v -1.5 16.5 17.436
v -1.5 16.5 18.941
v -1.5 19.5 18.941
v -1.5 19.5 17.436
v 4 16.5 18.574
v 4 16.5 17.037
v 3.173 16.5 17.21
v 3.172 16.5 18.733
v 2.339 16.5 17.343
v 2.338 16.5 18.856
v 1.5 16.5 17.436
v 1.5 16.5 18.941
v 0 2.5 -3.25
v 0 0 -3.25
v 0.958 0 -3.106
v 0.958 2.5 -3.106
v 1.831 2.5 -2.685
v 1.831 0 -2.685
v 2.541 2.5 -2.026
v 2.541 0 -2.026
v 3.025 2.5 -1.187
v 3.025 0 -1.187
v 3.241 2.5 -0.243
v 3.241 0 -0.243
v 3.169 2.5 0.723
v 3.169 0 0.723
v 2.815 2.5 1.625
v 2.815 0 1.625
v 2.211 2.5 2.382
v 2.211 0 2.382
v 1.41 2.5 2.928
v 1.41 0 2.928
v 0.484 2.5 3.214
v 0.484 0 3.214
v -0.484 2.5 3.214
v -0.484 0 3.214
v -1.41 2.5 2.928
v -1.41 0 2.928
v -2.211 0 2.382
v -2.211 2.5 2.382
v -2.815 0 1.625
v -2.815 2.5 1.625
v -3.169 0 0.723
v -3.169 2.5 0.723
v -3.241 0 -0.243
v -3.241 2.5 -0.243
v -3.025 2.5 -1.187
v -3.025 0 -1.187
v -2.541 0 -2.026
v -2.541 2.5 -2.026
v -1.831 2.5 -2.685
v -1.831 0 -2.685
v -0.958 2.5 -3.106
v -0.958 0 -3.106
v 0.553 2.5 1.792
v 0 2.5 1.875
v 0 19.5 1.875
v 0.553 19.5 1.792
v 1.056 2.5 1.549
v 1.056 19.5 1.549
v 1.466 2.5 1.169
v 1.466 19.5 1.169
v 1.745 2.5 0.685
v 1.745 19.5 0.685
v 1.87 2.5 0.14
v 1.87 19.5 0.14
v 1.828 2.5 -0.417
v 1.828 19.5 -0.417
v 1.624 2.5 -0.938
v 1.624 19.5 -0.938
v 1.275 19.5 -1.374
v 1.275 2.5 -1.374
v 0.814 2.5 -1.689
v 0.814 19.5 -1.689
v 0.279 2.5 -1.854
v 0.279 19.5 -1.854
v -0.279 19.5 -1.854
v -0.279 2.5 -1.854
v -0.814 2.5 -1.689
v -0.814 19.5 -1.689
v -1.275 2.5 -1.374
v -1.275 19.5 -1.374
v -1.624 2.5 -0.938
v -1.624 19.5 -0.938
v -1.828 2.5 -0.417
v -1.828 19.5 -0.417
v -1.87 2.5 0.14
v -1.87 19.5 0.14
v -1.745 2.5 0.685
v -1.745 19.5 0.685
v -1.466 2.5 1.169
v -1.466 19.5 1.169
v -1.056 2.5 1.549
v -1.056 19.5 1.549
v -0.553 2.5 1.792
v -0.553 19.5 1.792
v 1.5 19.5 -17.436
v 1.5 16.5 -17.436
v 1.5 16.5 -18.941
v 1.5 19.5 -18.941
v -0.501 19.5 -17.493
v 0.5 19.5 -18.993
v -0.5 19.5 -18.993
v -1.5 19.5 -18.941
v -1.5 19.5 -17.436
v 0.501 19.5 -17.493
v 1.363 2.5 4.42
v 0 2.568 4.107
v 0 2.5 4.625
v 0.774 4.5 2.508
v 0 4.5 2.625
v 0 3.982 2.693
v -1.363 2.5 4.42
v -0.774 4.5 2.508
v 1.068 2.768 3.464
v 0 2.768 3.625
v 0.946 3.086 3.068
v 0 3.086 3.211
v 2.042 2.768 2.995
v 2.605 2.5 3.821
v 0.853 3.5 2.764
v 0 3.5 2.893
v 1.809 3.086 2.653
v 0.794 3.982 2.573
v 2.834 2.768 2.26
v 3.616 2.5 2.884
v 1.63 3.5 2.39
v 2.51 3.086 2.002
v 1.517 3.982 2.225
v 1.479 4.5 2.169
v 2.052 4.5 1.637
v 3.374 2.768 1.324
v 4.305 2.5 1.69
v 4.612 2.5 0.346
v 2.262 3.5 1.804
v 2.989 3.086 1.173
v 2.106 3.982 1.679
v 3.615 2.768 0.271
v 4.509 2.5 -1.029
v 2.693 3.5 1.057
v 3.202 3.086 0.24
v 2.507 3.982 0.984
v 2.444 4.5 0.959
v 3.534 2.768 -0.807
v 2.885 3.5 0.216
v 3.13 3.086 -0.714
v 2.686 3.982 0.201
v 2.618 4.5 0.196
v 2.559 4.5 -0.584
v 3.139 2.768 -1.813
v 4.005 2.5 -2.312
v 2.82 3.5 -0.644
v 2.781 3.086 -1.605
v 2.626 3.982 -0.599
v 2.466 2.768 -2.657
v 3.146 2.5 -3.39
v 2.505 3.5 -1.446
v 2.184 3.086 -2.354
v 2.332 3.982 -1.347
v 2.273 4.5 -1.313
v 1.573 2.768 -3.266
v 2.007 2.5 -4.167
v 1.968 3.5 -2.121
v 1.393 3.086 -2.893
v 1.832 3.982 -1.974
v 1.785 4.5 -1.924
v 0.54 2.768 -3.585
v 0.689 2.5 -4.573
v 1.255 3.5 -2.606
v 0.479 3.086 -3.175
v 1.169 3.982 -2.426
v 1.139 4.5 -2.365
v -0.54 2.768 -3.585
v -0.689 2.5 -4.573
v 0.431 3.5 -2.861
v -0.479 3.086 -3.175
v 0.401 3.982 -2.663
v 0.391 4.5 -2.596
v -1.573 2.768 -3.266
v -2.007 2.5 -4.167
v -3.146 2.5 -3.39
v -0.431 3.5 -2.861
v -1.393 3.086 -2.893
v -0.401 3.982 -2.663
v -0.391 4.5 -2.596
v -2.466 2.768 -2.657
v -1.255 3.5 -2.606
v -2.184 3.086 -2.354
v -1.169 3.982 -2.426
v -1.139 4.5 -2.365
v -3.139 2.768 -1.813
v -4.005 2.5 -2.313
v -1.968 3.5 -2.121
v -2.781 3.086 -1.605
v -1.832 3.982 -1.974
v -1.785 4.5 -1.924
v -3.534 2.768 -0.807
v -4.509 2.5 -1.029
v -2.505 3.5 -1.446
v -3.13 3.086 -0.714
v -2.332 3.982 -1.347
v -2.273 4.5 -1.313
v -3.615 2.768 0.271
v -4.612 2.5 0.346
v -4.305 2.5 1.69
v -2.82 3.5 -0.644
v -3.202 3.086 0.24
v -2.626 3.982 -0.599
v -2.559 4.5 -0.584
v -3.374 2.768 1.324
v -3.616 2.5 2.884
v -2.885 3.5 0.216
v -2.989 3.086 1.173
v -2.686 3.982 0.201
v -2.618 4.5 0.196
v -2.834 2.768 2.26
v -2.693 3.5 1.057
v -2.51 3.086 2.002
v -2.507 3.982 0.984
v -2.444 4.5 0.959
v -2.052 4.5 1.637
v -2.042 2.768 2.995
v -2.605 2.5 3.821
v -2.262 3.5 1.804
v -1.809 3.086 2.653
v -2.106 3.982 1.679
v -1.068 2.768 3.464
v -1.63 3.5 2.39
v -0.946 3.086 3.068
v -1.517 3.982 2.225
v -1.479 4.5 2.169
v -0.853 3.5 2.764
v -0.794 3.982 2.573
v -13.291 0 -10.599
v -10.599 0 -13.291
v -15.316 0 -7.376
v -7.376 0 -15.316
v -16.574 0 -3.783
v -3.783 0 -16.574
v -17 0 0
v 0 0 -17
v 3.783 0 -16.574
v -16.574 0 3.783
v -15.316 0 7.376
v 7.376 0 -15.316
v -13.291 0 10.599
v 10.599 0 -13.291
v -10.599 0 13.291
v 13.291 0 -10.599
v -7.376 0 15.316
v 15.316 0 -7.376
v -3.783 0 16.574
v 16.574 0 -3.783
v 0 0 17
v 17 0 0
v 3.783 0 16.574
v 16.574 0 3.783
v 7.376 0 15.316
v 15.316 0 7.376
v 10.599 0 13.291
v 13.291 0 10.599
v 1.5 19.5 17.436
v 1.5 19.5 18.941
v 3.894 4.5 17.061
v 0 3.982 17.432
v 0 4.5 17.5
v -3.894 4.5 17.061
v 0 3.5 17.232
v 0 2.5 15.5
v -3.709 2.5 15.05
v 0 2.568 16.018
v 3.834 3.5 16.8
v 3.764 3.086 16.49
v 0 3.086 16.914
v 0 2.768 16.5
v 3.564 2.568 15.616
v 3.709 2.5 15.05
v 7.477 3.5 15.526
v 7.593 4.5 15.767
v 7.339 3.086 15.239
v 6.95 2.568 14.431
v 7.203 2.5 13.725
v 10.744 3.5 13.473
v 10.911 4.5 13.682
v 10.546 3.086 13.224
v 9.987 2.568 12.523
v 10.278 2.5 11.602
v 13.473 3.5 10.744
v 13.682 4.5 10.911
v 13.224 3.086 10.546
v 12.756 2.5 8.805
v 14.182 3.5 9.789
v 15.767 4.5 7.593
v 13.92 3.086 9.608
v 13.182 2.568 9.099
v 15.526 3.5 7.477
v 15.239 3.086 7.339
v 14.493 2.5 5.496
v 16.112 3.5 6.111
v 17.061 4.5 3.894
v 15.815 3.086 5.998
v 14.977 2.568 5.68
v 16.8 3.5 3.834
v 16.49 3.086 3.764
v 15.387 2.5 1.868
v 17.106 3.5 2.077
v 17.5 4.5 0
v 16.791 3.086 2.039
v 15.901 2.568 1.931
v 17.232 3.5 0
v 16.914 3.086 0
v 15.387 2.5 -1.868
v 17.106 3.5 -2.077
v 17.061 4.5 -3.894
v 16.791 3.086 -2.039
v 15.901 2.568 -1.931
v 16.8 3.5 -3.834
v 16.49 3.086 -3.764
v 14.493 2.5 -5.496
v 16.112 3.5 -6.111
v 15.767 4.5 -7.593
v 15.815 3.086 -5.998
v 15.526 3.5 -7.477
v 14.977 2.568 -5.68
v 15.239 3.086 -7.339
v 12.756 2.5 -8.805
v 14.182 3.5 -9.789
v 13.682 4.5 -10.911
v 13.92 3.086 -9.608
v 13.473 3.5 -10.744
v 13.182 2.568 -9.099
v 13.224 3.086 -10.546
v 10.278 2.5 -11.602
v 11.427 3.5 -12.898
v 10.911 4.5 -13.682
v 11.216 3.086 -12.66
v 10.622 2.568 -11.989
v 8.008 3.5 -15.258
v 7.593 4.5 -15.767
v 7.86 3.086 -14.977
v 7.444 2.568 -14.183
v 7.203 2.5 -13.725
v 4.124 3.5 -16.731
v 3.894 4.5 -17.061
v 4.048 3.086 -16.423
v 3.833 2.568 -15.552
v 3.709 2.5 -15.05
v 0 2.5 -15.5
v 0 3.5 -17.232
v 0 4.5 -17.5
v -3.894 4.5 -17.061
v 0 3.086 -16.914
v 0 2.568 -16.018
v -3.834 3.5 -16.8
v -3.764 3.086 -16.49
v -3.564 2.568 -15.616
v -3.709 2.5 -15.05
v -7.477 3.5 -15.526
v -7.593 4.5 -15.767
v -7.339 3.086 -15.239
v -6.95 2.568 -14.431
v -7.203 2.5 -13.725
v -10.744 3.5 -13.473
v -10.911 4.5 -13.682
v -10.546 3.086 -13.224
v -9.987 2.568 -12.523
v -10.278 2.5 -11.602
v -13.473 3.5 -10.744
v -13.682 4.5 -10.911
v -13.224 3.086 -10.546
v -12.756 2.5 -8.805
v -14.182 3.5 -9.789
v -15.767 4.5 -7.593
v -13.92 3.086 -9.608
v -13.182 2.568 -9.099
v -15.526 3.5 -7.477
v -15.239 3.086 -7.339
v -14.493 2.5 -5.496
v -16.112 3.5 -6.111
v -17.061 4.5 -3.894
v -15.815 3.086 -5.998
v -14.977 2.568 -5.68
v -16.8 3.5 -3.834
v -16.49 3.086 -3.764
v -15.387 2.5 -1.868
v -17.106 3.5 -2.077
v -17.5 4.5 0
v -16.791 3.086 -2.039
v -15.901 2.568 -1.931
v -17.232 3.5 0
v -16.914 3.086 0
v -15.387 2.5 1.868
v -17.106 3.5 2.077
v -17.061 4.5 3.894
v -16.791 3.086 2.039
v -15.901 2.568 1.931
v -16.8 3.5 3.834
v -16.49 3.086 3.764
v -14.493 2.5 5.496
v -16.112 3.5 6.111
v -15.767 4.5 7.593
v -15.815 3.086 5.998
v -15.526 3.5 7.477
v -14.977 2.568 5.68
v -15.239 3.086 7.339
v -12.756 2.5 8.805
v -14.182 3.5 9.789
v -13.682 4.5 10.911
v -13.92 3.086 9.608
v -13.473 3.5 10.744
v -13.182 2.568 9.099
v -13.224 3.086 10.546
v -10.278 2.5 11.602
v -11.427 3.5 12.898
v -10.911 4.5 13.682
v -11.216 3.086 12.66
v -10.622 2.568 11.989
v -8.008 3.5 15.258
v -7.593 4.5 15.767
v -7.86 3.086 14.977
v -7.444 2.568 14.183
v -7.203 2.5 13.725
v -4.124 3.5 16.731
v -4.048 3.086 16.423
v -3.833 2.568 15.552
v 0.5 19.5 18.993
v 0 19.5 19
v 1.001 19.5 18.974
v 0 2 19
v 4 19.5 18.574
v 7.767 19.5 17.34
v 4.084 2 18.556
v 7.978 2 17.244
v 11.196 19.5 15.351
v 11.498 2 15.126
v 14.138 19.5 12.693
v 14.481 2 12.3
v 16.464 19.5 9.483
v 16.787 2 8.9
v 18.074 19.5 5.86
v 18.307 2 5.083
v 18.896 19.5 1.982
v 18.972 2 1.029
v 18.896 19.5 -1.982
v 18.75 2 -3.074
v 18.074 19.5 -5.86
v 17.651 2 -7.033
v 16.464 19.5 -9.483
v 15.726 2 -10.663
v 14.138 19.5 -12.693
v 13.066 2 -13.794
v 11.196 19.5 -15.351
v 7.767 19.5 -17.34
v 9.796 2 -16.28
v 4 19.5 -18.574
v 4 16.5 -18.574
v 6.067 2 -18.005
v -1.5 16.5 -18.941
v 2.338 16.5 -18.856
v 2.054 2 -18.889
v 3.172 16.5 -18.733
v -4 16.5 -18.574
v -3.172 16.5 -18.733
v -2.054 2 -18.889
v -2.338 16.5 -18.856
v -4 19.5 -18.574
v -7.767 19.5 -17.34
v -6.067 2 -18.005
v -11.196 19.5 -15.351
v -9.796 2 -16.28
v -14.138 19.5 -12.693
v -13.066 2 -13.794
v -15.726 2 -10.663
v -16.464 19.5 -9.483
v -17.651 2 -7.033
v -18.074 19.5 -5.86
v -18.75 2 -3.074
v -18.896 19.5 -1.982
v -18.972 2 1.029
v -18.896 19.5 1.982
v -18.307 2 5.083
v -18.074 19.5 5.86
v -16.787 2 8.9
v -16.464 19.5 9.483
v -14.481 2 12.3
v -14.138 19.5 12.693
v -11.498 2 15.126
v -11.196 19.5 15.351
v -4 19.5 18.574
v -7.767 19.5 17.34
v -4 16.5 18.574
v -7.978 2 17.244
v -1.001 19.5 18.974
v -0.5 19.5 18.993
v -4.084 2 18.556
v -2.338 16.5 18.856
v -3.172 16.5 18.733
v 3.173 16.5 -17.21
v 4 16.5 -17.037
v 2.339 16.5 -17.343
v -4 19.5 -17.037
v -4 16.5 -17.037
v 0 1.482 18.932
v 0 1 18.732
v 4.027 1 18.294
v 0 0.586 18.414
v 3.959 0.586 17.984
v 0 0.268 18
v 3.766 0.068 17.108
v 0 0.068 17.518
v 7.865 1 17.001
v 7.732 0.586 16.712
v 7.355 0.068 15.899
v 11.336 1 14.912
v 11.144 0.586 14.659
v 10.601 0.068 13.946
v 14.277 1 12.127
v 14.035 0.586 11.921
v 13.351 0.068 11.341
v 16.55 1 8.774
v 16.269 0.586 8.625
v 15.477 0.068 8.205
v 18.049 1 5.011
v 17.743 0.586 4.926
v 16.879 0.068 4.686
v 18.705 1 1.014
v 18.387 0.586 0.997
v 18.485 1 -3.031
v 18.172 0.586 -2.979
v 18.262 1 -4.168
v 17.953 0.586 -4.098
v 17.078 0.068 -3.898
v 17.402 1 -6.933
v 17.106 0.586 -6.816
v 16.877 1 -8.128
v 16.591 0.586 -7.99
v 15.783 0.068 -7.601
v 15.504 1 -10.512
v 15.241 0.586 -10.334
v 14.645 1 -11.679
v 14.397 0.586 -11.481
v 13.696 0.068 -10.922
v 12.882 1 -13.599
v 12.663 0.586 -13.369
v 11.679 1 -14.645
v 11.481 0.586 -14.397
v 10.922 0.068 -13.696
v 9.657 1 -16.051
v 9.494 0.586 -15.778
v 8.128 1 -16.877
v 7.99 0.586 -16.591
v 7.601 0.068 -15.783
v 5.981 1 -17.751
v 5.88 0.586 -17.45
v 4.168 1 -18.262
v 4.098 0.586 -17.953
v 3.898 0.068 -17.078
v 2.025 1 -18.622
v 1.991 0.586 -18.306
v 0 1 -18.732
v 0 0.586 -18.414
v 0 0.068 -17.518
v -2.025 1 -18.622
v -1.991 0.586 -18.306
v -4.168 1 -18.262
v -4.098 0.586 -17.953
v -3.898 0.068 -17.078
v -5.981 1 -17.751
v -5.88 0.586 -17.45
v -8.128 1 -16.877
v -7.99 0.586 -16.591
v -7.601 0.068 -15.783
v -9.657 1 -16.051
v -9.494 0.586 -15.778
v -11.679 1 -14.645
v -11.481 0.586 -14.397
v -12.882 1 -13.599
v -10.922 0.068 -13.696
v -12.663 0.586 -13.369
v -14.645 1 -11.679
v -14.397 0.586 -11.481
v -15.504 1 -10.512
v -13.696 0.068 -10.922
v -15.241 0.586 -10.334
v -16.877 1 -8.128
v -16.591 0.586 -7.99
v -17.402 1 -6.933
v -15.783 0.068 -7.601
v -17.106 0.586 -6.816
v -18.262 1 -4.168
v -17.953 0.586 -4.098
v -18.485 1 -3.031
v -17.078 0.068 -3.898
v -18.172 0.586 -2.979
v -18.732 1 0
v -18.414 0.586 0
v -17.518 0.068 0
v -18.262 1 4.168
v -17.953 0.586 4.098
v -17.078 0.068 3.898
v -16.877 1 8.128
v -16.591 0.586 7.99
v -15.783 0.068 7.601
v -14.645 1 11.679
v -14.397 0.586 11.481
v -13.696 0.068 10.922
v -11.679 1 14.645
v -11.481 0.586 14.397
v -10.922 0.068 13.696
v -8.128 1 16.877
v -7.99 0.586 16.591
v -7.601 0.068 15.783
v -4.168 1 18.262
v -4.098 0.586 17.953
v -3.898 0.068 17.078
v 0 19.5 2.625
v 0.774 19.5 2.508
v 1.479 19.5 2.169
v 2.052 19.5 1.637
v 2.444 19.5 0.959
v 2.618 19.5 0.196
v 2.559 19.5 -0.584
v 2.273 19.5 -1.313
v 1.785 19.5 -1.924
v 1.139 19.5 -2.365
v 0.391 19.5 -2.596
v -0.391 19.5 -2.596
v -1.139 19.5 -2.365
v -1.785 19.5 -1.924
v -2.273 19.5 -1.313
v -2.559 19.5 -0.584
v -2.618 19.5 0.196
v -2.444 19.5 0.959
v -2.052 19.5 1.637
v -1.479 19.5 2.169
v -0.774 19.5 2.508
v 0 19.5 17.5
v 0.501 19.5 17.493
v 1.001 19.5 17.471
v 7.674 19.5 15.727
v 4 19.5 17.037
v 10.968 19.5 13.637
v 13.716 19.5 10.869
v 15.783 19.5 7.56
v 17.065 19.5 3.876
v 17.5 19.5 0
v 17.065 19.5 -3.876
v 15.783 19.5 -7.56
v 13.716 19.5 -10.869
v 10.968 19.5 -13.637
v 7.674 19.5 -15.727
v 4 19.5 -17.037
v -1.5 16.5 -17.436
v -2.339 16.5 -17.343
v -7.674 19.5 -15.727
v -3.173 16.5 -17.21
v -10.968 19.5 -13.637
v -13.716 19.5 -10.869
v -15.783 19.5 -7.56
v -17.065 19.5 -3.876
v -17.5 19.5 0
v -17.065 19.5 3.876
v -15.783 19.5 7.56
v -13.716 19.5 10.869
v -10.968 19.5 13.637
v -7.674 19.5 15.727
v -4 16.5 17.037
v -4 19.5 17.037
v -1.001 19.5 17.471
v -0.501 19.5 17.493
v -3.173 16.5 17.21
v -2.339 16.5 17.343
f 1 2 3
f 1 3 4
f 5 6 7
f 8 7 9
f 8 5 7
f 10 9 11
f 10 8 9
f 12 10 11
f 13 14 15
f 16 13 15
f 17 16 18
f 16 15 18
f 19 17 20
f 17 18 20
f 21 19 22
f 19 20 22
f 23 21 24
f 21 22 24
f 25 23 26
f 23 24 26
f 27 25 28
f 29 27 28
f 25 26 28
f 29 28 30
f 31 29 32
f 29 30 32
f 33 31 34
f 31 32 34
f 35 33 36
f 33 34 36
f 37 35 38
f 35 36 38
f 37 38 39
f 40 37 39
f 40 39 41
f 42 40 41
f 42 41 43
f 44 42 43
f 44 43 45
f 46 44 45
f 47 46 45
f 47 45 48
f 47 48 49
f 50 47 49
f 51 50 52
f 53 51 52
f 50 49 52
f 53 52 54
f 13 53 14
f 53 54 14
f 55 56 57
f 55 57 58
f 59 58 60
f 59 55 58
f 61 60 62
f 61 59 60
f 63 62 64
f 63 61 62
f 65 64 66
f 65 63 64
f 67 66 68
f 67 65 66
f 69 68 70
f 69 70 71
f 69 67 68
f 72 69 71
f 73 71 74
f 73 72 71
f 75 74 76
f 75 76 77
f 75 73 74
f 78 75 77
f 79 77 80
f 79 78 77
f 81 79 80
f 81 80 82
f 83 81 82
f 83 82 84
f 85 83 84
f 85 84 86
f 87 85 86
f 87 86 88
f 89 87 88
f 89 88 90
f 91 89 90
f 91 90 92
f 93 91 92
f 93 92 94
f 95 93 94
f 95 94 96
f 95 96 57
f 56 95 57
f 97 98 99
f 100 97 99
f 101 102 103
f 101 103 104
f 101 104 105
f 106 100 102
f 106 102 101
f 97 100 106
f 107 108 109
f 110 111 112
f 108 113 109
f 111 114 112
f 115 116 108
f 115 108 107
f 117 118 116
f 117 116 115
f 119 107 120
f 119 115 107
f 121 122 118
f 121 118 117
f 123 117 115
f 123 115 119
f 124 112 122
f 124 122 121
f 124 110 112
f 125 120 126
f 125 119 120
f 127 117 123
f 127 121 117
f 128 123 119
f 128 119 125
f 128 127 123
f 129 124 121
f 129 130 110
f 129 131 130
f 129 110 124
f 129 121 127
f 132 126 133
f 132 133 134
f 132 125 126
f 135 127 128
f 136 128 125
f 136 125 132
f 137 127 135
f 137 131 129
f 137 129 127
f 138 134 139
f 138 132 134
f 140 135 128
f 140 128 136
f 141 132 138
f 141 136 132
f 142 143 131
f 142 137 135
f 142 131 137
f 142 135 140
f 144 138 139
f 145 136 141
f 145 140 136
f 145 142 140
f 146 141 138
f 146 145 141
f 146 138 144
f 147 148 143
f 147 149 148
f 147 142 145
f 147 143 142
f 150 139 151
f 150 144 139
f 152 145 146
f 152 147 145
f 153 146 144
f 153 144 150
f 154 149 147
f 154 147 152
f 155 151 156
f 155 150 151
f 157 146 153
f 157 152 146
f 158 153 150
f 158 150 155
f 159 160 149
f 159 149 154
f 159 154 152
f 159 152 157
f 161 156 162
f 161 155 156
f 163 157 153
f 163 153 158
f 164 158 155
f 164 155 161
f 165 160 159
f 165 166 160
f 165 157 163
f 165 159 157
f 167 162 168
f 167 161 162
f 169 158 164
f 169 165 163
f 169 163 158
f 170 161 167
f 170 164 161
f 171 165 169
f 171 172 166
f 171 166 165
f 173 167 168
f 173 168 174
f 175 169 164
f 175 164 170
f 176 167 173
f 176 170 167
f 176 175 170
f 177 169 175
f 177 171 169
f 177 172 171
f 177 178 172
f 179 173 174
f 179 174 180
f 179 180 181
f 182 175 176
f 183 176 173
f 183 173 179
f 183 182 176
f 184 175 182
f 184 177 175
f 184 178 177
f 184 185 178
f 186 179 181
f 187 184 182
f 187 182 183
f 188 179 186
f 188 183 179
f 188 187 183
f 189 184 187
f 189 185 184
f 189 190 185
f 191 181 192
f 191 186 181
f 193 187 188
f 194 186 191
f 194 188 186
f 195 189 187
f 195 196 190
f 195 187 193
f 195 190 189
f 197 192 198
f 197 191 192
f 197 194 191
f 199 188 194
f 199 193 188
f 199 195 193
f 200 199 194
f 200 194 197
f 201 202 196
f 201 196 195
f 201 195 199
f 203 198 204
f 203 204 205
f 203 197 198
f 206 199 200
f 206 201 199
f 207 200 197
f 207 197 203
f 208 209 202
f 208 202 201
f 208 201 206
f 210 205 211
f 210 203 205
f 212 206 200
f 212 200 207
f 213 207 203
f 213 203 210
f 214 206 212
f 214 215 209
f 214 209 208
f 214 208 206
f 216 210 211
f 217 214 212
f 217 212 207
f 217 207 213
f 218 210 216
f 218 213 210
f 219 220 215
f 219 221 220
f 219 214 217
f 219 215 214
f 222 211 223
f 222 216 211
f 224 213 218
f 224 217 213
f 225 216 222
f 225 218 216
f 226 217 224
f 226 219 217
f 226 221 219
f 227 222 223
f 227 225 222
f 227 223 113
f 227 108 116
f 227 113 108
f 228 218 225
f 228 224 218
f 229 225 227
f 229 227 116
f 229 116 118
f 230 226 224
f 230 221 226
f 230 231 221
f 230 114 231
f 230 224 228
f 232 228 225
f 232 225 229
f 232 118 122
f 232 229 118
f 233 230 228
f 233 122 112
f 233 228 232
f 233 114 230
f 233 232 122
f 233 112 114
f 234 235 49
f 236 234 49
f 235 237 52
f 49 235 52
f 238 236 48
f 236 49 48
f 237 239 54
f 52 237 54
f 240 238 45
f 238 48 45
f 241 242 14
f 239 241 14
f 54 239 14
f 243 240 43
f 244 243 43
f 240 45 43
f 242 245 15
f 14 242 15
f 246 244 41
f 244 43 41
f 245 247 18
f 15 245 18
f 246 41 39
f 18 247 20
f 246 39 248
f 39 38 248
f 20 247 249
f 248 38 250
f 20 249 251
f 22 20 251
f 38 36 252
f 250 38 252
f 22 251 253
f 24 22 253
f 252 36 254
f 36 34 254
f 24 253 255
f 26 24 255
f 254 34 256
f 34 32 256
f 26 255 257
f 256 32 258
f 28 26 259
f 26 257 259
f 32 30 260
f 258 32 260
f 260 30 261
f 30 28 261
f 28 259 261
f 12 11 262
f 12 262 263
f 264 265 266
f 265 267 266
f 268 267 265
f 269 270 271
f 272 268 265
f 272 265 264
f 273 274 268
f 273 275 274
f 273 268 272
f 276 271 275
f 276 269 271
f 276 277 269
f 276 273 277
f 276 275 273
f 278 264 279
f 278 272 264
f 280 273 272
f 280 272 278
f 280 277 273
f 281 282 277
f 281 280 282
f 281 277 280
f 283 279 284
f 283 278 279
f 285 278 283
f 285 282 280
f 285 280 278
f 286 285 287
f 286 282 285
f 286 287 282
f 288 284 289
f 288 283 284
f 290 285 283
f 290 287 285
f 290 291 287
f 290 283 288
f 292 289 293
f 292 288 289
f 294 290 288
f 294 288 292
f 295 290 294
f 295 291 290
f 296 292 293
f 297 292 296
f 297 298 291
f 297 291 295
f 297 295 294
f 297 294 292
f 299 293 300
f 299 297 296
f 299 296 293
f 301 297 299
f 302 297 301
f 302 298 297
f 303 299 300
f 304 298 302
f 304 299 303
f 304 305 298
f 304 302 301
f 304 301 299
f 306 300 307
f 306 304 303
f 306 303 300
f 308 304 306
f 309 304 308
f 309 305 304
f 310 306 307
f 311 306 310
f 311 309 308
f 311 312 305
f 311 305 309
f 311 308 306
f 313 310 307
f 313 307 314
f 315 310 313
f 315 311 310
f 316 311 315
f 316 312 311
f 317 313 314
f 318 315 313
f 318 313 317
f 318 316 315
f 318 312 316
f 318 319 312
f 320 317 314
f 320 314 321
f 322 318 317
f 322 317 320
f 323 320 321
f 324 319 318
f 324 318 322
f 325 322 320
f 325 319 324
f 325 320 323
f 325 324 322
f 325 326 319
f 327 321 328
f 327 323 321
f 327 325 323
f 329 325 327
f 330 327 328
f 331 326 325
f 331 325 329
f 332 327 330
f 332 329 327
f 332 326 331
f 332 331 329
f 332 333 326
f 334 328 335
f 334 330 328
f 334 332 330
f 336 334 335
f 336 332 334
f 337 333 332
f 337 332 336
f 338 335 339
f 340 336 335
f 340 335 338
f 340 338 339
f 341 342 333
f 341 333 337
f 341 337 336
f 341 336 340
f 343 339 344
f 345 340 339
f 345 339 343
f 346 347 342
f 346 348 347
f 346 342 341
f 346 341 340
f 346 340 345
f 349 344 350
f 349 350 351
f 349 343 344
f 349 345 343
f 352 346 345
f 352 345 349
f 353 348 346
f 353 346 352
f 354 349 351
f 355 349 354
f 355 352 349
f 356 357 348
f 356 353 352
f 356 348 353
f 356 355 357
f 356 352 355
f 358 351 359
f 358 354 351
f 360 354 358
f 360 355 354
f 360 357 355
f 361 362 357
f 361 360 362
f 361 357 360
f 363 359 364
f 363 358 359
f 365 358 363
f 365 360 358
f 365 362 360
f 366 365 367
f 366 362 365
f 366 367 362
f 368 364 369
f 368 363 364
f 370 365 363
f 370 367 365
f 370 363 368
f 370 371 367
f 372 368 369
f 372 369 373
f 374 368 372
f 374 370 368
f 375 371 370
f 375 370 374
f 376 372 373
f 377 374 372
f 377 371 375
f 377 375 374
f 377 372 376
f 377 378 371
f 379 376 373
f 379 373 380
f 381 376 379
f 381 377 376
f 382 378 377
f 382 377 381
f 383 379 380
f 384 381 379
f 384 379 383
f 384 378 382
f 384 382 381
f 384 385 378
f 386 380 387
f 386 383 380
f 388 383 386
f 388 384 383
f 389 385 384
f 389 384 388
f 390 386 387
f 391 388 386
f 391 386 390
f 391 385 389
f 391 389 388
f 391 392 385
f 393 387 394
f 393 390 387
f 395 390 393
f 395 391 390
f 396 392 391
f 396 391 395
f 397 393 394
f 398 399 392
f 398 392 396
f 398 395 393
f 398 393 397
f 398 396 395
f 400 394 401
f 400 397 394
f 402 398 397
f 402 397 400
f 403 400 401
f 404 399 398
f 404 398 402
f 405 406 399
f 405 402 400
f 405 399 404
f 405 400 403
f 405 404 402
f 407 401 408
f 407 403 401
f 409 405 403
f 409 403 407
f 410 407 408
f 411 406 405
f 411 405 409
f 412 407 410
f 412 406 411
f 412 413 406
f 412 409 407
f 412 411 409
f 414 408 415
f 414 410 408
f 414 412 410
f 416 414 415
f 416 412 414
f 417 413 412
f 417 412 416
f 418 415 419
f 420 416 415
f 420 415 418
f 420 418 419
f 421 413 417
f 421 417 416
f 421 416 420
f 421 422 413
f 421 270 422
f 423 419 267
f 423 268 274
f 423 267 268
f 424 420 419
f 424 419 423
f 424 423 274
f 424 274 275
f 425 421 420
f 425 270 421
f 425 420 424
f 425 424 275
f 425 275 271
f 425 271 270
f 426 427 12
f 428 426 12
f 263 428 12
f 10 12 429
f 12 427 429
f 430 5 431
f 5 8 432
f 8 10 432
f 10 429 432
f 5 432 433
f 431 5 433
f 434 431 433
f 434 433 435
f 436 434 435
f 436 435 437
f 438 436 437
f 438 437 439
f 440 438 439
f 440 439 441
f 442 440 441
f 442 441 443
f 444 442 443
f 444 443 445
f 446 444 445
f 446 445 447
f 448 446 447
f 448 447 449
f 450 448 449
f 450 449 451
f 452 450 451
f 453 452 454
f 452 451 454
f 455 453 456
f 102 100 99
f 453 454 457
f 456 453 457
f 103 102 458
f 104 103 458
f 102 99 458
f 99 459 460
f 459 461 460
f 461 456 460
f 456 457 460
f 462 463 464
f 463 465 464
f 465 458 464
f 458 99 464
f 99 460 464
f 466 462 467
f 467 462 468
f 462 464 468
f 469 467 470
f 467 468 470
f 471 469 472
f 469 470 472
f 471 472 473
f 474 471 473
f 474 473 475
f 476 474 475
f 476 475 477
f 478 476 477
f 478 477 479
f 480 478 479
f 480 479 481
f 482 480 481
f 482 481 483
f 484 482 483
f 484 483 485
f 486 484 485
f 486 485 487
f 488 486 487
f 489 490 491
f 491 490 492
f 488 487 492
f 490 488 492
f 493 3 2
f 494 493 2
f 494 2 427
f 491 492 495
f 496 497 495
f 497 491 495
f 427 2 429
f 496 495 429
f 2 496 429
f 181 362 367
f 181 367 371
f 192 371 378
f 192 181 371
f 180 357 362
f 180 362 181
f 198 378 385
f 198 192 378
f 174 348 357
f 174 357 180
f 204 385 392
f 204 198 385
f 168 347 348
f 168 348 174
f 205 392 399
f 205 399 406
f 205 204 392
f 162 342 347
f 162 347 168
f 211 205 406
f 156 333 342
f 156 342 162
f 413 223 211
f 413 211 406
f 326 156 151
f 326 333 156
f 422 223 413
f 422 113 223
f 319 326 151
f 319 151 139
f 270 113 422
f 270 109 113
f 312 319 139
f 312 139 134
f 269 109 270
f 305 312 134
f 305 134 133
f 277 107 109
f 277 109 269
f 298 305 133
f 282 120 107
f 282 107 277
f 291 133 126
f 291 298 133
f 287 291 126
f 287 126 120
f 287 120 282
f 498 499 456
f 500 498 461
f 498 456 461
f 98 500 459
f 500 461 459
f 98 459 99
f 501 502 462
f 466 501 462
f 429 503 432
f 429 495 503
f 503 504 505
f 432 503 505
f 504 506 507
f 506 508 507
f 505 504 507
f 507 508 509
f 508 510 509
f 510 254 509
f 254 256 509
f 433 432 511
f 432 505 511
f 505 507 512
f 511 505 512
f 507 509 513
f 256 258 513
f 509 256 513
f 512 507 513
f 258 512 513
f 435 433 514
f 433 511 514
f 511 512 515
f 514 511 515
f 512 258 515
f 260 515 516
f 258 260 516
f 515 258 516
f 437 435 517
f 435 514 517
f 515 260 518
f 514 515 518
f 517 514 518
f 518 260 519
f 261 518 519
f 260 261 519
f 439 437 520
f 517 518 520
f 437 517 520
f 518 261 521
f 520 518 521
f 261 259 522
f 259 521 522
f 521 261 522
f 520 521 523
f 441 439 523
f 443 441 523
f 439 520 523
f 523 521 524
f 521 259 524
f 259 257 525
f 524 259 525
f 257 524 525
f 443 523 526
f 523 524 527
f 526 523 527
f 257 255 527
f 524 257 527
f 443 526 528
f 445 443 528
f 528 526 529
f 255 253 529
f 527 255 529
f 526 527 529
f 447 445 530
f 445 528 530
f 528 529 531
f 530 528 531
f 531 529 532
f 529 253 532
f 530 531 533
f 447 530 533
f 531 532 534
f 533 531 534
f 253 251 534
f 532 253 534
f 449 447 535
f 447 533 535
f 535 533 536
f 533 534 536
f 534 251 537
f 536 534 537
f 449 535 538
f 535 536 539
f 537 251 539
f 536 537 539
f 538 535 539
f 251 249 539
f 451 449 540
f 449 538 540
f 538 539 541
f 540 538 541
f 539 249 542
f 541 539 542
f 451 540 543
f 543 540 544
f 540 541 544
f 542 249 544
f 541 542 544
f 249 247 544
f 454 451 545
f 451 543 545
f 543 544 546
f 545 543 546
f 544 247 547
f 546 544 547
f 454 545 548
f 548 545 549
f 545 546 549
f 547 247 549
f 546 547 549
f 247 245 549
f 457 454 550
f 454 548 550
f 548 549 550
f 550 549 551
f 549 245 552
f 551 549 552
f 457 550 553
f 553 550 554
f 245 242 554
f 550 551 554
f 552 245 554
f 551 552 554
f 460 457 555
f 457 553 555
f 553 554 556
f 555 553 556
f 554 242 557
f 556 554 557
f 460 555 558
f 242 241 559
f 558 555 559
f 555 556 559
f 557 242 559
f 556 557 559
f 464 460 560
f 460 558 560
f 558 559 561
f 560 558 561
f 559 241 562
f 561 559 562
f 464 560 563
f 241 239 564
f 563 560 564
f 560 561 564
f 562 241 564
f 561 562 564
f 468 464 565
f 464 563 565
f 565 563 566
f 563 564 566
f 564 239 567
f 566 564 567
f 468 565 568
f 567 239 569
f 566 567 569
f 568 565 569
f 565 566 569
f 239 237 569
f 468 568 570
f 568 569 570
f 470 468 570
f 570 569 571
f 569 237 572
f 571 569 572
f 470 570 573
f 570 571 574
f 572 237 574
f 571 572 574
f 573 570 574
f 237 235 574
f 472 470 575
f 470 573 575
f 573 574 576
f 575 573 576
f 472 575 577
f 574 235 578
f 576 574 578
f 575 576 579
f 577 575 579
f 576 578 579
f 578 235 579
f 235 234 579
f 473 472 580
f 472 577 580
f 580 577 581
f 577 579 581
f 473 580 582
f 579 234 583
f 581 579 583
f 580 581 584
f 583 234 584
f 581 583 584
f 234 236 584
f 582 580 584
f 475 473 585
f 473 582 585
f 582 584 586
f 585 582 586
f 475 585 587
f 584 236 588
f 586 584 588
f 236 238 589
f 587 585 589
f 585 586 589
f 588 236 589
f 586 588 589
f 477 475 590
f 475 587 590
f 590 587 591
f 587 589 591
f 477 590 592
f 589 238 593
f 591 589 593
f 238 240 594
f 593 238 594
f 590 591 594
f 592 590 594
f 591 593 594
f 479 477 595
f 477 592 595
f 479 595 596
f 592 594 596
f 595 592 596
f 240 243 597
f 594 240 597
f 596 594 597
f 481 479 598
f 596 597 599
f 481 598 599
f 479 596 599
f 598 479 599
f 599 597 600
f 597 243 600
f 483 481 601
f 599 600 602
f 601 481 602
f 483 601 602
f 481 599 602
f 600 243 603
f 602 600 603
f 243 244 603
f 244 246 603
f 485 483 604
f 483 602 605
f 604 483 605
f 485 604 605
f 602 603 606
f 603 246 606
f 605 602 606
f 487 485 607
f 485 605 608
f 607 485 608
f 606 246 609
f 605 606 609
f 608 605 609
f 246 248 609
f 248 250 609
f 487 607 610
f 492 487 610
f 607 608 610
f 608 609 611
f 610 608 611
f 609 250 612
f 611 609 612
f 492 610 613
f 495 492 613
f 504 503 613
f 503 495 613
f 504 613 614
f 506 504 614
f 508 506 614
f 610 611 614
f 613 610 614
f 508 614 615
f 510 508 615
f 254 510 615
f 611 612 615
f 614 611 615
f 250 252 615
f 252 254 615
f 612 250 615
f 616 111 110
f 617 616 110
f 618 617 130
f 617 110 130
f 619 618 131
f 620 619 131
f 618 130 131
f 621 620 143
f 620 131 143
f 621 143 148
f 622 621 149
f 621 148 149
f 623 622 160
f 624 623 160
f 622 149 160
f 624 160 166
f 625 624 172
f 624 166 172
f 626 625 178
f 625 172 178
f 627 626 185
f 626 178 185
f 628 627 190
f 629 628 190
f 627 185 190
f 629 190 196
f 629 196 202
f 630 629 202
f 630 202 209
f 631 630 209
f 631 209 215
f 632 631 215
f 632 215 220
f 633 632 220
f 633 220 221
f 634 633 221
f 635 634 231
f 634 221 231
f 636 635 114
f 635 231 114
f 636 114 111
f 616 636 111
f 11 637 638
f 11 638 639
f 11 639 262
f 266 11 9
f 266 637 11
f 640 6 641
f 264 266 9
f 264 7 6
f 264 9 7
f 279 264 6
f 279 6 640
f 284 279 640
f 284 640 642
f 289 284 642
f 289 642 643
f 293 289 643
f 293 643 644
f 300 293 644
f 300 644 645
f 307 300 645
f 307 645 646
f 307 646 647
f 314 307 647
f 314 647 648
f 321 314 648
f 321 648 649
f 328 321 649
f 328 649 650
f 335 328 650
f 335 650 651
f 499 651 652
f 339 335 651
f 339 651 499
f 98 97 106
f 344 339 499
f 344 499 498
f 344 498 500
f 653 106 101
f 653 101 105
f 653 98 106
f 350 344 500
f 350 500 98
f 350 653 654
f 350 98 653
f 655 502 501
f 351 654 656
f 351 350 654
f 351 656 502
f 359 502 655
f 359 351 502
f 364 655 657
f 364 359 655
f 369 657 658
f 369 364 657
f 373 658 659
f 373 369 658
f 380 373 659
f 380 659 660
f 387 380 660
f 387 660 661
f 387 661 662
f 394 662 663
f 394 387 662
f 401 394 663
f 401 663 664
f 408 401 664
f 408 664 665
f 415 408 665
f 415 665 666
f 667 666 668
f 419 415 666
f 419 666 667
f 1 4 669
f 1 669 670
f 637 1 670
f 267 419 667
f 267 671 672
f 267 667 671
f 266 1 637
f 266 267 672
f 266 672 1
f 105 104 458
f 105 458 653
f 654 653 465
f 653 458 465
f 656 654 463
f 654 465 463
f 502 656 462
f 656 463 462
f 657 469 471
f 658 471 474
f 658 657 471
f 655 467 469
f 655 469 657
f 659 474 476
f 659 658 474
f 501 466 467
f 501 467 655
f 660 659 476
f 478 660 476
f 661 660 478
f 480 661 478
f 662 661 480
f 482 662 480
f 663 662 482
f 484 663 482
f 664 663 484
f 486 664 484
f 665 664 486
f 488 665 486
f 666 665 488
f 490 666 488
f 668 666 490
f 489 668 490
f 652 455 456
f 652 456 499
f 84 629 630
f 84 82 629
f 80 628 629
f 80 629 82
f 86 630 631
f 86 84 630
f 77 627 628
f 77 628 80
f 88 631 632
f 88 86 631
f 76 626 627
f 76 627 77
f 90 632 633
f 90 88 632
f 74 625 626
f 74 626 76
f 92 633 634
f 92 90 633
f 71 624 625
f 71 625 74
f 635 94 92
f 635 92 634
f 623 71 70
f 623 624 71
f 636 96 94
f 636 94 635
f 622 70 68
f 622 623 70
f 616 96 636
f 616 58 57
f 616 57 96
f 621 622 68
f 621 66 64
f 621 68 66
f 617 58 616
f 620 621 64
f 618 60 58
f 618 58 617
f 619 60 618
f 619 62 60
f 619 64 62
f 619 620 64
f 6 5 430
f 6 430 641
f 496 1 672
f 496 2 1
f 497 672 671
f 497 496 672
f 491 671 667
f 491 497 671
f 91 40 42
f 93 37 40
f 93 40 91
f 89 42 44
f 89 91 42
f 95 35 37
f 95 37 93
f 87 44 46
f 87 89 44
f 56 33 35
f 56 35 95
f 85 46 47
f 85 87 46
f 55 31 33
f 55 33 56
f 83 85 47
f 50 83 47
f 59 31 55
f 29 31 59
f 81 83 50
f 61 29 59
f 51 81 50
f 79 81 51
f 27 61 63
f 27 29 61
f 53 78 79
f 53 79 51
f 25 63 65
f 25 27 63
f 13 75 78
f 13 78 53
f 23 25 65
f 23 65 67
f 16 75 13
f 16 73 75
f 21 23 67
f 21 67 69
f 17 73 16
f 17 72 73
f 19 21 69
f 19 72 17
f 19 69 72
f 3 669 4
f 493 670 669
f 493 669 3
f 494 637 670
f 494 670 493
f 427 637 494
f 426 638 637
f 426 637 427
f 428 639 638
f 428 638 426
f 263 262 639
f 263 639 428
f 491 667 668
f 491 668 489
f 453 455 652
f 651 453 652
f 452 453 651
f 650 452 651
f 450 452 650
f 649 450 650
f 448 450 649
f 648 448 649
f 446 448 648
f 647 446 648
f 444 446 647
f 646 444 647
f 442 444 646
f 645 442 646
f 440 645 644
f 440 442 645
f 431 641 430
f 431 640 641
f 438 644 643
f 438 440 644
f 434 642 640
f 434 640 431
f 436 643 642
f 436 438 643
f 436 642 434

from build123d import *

# Parameters (mm, degrees)
SKETCH1_R           = 19
BOSS_EXTRUDE1_DEPTH = 2.5
BOSS_EXTRUDE2_START = 2.5
SKETCH1_3_R         = 19
SKETCH1_3_R_2       = 17.5
BOSS_EXTRUDE2_DEPTH = 17
BOSS_EXTRUDE3_START = 2.5
SKETCH1_5_R         = 2.625
SKETCH1_5_R_2       = 1.875
BOSS_EXTRUDE3_DEPTH = 17
SKETCH1_6_R         = 1.875
CUT_EXTRUDE3_DEPTH  = 34.200150602
FILLET1_R           = 2
FILLET2_R           = 2
SKETCH2_R           = 3.25
CUT_EXTRUDE5_DEPTH  = 2.5
CUT_EXTRUDE6_START  = -3
CUT_EXTRUDE6_DEPTH  = 3


with BuildPart() as part:
    # Sketch1 → Boss-Extrude1 (new body)
    with BuildSketch(Plane(origin=(0, 0, 0), x_dir=(1, 0, 0), z_dir=(0, 1, 0))):
        with Locations(Location((0, 0, 0), (0, 0, 270))):
            Circle(SKETCH1_R)
    extrude(amount=BOSS_EXTRUDE1_DEPTH)

    # Sketch1<3> → Boss-Extrude2 (add)
    with BuildSketch(Plane(origin=(0, 0, 0), x_dir=(1, 0, 0), z_dir=(0, 1, 0)).offset(BOSS_EXTRUDE2_START)):
        with Locations(Location((0, 0, 0), (0, 0, 270))):
            Circle(SKETCH1_3_R)
        with Locations(Location((0, 0, 0), (0, 0, 270))):
            Circle(SKETCH1_3_R_2, mode=Mode.SUBTRACT)
    extrude(amount=BOSS_EXTRUDE2_DEPTH)

    # Sketch1<5> → Boss-Extrude3 (add)
    with BuildSketch(Plane(origin=(0, 0, 0), x_dir=(1, 0, 0), z_dir=(0, 1, 0)).offset(BOSS_EXTRUDE3_START)):
        with Locations(Location((0, 0, 0), (0, 0, 270))):
            Circle(SKETCH1_5_R)
        with Locations(Location((0, 0, 0), (0, 0, 270))):
            Circle(SKETCH1_5_R_2, mode=Mode.SUBTRACT)
    extrude(amount=BOSS_EXTRUDE3_DEPTH)

    # Sketch1<6> → Cut-Extrude3 (cut, through all)
    with BuildSketch(Plane(origin=(0, 0, 0), x_dir=(1, 0, 0), z_dir=(0, 1, 0))):
        with Locations(Location((0, 0, 0), (0, 0, 270))):
            Circle(SKETCH1_6_R)
    extrude(amount=CUT_EXTRUDE3_DEPTH, mode=Mode.SUBTRACT)

    # Fillet1
    fillet1_edges = [part.edges().sort_by_distance(p)[0] for p in [
        (0, 0, -19),
    ]]
    fillet(fillet1_edges, radius=FILLET1_R)

    # Fillet2
    fillet2_edges = [part.edges().sort_by_distance(p)[0] for p in [
        (0, 2.5, -2.625),
        (0, 2.5, -17.5),
    ]]
    fillet(fillet2_edges, radius=FILLET2_R)

    # Sketch2 → Cut-Extrude5 (cut)
    with BuildSketch(Plane.XZ):
        with Locations(Location((0, 0, 0), (0, 0, 270))):
            Circle(SKETCH2_R)
    extrude(amount=-CUT_EXTRUDE5_DEPTH, mode=Mode.SUBTRACT)

    # Sketch3 → Cut-Extrude6 (cut)
    with BuildSketch(Plane(origin=(0, 19.5, 0), x_dir=(1, 0, 0), z_dir=(0, 1, 0)).offset(CUT_EXTRUDE6_START)):
        with BuildLine():
            Line((-4, 17.036725037), (-4, 22.5))
            Line((-4, 22.5), (-1.5, 22.5))
            Line((-1.5, 22.5), (-1.5, 17.435595774))
            ThreePointArc((-1.5, 17.435595774), (-2.757222237, 17.281427185), (-4, 17.036725037))
        make_face()
        with BuildLine():
            Line((4, 22.5), (4, 17.036725037))
            ThreePointArc((4, 17.036725037), (2.757222237, 17.281427185), (1.5, 17.435595774))
            Line((1.5, 17.435595774), (1.5, 22.5))
            Line((1.5, 22.5), (4, 22.5))
        make_face()
    cut_extrude6 = extrude(amount=CUT_EXTRUDE6_DEPTH, mode=Mode.SUBTRACT)

    # Mirror1: Cut-Extrude6 across plane
    add(cut_extrude6.mirror(Plane.XY), mode=Mode.SUBTRACT)


solid = part.part
